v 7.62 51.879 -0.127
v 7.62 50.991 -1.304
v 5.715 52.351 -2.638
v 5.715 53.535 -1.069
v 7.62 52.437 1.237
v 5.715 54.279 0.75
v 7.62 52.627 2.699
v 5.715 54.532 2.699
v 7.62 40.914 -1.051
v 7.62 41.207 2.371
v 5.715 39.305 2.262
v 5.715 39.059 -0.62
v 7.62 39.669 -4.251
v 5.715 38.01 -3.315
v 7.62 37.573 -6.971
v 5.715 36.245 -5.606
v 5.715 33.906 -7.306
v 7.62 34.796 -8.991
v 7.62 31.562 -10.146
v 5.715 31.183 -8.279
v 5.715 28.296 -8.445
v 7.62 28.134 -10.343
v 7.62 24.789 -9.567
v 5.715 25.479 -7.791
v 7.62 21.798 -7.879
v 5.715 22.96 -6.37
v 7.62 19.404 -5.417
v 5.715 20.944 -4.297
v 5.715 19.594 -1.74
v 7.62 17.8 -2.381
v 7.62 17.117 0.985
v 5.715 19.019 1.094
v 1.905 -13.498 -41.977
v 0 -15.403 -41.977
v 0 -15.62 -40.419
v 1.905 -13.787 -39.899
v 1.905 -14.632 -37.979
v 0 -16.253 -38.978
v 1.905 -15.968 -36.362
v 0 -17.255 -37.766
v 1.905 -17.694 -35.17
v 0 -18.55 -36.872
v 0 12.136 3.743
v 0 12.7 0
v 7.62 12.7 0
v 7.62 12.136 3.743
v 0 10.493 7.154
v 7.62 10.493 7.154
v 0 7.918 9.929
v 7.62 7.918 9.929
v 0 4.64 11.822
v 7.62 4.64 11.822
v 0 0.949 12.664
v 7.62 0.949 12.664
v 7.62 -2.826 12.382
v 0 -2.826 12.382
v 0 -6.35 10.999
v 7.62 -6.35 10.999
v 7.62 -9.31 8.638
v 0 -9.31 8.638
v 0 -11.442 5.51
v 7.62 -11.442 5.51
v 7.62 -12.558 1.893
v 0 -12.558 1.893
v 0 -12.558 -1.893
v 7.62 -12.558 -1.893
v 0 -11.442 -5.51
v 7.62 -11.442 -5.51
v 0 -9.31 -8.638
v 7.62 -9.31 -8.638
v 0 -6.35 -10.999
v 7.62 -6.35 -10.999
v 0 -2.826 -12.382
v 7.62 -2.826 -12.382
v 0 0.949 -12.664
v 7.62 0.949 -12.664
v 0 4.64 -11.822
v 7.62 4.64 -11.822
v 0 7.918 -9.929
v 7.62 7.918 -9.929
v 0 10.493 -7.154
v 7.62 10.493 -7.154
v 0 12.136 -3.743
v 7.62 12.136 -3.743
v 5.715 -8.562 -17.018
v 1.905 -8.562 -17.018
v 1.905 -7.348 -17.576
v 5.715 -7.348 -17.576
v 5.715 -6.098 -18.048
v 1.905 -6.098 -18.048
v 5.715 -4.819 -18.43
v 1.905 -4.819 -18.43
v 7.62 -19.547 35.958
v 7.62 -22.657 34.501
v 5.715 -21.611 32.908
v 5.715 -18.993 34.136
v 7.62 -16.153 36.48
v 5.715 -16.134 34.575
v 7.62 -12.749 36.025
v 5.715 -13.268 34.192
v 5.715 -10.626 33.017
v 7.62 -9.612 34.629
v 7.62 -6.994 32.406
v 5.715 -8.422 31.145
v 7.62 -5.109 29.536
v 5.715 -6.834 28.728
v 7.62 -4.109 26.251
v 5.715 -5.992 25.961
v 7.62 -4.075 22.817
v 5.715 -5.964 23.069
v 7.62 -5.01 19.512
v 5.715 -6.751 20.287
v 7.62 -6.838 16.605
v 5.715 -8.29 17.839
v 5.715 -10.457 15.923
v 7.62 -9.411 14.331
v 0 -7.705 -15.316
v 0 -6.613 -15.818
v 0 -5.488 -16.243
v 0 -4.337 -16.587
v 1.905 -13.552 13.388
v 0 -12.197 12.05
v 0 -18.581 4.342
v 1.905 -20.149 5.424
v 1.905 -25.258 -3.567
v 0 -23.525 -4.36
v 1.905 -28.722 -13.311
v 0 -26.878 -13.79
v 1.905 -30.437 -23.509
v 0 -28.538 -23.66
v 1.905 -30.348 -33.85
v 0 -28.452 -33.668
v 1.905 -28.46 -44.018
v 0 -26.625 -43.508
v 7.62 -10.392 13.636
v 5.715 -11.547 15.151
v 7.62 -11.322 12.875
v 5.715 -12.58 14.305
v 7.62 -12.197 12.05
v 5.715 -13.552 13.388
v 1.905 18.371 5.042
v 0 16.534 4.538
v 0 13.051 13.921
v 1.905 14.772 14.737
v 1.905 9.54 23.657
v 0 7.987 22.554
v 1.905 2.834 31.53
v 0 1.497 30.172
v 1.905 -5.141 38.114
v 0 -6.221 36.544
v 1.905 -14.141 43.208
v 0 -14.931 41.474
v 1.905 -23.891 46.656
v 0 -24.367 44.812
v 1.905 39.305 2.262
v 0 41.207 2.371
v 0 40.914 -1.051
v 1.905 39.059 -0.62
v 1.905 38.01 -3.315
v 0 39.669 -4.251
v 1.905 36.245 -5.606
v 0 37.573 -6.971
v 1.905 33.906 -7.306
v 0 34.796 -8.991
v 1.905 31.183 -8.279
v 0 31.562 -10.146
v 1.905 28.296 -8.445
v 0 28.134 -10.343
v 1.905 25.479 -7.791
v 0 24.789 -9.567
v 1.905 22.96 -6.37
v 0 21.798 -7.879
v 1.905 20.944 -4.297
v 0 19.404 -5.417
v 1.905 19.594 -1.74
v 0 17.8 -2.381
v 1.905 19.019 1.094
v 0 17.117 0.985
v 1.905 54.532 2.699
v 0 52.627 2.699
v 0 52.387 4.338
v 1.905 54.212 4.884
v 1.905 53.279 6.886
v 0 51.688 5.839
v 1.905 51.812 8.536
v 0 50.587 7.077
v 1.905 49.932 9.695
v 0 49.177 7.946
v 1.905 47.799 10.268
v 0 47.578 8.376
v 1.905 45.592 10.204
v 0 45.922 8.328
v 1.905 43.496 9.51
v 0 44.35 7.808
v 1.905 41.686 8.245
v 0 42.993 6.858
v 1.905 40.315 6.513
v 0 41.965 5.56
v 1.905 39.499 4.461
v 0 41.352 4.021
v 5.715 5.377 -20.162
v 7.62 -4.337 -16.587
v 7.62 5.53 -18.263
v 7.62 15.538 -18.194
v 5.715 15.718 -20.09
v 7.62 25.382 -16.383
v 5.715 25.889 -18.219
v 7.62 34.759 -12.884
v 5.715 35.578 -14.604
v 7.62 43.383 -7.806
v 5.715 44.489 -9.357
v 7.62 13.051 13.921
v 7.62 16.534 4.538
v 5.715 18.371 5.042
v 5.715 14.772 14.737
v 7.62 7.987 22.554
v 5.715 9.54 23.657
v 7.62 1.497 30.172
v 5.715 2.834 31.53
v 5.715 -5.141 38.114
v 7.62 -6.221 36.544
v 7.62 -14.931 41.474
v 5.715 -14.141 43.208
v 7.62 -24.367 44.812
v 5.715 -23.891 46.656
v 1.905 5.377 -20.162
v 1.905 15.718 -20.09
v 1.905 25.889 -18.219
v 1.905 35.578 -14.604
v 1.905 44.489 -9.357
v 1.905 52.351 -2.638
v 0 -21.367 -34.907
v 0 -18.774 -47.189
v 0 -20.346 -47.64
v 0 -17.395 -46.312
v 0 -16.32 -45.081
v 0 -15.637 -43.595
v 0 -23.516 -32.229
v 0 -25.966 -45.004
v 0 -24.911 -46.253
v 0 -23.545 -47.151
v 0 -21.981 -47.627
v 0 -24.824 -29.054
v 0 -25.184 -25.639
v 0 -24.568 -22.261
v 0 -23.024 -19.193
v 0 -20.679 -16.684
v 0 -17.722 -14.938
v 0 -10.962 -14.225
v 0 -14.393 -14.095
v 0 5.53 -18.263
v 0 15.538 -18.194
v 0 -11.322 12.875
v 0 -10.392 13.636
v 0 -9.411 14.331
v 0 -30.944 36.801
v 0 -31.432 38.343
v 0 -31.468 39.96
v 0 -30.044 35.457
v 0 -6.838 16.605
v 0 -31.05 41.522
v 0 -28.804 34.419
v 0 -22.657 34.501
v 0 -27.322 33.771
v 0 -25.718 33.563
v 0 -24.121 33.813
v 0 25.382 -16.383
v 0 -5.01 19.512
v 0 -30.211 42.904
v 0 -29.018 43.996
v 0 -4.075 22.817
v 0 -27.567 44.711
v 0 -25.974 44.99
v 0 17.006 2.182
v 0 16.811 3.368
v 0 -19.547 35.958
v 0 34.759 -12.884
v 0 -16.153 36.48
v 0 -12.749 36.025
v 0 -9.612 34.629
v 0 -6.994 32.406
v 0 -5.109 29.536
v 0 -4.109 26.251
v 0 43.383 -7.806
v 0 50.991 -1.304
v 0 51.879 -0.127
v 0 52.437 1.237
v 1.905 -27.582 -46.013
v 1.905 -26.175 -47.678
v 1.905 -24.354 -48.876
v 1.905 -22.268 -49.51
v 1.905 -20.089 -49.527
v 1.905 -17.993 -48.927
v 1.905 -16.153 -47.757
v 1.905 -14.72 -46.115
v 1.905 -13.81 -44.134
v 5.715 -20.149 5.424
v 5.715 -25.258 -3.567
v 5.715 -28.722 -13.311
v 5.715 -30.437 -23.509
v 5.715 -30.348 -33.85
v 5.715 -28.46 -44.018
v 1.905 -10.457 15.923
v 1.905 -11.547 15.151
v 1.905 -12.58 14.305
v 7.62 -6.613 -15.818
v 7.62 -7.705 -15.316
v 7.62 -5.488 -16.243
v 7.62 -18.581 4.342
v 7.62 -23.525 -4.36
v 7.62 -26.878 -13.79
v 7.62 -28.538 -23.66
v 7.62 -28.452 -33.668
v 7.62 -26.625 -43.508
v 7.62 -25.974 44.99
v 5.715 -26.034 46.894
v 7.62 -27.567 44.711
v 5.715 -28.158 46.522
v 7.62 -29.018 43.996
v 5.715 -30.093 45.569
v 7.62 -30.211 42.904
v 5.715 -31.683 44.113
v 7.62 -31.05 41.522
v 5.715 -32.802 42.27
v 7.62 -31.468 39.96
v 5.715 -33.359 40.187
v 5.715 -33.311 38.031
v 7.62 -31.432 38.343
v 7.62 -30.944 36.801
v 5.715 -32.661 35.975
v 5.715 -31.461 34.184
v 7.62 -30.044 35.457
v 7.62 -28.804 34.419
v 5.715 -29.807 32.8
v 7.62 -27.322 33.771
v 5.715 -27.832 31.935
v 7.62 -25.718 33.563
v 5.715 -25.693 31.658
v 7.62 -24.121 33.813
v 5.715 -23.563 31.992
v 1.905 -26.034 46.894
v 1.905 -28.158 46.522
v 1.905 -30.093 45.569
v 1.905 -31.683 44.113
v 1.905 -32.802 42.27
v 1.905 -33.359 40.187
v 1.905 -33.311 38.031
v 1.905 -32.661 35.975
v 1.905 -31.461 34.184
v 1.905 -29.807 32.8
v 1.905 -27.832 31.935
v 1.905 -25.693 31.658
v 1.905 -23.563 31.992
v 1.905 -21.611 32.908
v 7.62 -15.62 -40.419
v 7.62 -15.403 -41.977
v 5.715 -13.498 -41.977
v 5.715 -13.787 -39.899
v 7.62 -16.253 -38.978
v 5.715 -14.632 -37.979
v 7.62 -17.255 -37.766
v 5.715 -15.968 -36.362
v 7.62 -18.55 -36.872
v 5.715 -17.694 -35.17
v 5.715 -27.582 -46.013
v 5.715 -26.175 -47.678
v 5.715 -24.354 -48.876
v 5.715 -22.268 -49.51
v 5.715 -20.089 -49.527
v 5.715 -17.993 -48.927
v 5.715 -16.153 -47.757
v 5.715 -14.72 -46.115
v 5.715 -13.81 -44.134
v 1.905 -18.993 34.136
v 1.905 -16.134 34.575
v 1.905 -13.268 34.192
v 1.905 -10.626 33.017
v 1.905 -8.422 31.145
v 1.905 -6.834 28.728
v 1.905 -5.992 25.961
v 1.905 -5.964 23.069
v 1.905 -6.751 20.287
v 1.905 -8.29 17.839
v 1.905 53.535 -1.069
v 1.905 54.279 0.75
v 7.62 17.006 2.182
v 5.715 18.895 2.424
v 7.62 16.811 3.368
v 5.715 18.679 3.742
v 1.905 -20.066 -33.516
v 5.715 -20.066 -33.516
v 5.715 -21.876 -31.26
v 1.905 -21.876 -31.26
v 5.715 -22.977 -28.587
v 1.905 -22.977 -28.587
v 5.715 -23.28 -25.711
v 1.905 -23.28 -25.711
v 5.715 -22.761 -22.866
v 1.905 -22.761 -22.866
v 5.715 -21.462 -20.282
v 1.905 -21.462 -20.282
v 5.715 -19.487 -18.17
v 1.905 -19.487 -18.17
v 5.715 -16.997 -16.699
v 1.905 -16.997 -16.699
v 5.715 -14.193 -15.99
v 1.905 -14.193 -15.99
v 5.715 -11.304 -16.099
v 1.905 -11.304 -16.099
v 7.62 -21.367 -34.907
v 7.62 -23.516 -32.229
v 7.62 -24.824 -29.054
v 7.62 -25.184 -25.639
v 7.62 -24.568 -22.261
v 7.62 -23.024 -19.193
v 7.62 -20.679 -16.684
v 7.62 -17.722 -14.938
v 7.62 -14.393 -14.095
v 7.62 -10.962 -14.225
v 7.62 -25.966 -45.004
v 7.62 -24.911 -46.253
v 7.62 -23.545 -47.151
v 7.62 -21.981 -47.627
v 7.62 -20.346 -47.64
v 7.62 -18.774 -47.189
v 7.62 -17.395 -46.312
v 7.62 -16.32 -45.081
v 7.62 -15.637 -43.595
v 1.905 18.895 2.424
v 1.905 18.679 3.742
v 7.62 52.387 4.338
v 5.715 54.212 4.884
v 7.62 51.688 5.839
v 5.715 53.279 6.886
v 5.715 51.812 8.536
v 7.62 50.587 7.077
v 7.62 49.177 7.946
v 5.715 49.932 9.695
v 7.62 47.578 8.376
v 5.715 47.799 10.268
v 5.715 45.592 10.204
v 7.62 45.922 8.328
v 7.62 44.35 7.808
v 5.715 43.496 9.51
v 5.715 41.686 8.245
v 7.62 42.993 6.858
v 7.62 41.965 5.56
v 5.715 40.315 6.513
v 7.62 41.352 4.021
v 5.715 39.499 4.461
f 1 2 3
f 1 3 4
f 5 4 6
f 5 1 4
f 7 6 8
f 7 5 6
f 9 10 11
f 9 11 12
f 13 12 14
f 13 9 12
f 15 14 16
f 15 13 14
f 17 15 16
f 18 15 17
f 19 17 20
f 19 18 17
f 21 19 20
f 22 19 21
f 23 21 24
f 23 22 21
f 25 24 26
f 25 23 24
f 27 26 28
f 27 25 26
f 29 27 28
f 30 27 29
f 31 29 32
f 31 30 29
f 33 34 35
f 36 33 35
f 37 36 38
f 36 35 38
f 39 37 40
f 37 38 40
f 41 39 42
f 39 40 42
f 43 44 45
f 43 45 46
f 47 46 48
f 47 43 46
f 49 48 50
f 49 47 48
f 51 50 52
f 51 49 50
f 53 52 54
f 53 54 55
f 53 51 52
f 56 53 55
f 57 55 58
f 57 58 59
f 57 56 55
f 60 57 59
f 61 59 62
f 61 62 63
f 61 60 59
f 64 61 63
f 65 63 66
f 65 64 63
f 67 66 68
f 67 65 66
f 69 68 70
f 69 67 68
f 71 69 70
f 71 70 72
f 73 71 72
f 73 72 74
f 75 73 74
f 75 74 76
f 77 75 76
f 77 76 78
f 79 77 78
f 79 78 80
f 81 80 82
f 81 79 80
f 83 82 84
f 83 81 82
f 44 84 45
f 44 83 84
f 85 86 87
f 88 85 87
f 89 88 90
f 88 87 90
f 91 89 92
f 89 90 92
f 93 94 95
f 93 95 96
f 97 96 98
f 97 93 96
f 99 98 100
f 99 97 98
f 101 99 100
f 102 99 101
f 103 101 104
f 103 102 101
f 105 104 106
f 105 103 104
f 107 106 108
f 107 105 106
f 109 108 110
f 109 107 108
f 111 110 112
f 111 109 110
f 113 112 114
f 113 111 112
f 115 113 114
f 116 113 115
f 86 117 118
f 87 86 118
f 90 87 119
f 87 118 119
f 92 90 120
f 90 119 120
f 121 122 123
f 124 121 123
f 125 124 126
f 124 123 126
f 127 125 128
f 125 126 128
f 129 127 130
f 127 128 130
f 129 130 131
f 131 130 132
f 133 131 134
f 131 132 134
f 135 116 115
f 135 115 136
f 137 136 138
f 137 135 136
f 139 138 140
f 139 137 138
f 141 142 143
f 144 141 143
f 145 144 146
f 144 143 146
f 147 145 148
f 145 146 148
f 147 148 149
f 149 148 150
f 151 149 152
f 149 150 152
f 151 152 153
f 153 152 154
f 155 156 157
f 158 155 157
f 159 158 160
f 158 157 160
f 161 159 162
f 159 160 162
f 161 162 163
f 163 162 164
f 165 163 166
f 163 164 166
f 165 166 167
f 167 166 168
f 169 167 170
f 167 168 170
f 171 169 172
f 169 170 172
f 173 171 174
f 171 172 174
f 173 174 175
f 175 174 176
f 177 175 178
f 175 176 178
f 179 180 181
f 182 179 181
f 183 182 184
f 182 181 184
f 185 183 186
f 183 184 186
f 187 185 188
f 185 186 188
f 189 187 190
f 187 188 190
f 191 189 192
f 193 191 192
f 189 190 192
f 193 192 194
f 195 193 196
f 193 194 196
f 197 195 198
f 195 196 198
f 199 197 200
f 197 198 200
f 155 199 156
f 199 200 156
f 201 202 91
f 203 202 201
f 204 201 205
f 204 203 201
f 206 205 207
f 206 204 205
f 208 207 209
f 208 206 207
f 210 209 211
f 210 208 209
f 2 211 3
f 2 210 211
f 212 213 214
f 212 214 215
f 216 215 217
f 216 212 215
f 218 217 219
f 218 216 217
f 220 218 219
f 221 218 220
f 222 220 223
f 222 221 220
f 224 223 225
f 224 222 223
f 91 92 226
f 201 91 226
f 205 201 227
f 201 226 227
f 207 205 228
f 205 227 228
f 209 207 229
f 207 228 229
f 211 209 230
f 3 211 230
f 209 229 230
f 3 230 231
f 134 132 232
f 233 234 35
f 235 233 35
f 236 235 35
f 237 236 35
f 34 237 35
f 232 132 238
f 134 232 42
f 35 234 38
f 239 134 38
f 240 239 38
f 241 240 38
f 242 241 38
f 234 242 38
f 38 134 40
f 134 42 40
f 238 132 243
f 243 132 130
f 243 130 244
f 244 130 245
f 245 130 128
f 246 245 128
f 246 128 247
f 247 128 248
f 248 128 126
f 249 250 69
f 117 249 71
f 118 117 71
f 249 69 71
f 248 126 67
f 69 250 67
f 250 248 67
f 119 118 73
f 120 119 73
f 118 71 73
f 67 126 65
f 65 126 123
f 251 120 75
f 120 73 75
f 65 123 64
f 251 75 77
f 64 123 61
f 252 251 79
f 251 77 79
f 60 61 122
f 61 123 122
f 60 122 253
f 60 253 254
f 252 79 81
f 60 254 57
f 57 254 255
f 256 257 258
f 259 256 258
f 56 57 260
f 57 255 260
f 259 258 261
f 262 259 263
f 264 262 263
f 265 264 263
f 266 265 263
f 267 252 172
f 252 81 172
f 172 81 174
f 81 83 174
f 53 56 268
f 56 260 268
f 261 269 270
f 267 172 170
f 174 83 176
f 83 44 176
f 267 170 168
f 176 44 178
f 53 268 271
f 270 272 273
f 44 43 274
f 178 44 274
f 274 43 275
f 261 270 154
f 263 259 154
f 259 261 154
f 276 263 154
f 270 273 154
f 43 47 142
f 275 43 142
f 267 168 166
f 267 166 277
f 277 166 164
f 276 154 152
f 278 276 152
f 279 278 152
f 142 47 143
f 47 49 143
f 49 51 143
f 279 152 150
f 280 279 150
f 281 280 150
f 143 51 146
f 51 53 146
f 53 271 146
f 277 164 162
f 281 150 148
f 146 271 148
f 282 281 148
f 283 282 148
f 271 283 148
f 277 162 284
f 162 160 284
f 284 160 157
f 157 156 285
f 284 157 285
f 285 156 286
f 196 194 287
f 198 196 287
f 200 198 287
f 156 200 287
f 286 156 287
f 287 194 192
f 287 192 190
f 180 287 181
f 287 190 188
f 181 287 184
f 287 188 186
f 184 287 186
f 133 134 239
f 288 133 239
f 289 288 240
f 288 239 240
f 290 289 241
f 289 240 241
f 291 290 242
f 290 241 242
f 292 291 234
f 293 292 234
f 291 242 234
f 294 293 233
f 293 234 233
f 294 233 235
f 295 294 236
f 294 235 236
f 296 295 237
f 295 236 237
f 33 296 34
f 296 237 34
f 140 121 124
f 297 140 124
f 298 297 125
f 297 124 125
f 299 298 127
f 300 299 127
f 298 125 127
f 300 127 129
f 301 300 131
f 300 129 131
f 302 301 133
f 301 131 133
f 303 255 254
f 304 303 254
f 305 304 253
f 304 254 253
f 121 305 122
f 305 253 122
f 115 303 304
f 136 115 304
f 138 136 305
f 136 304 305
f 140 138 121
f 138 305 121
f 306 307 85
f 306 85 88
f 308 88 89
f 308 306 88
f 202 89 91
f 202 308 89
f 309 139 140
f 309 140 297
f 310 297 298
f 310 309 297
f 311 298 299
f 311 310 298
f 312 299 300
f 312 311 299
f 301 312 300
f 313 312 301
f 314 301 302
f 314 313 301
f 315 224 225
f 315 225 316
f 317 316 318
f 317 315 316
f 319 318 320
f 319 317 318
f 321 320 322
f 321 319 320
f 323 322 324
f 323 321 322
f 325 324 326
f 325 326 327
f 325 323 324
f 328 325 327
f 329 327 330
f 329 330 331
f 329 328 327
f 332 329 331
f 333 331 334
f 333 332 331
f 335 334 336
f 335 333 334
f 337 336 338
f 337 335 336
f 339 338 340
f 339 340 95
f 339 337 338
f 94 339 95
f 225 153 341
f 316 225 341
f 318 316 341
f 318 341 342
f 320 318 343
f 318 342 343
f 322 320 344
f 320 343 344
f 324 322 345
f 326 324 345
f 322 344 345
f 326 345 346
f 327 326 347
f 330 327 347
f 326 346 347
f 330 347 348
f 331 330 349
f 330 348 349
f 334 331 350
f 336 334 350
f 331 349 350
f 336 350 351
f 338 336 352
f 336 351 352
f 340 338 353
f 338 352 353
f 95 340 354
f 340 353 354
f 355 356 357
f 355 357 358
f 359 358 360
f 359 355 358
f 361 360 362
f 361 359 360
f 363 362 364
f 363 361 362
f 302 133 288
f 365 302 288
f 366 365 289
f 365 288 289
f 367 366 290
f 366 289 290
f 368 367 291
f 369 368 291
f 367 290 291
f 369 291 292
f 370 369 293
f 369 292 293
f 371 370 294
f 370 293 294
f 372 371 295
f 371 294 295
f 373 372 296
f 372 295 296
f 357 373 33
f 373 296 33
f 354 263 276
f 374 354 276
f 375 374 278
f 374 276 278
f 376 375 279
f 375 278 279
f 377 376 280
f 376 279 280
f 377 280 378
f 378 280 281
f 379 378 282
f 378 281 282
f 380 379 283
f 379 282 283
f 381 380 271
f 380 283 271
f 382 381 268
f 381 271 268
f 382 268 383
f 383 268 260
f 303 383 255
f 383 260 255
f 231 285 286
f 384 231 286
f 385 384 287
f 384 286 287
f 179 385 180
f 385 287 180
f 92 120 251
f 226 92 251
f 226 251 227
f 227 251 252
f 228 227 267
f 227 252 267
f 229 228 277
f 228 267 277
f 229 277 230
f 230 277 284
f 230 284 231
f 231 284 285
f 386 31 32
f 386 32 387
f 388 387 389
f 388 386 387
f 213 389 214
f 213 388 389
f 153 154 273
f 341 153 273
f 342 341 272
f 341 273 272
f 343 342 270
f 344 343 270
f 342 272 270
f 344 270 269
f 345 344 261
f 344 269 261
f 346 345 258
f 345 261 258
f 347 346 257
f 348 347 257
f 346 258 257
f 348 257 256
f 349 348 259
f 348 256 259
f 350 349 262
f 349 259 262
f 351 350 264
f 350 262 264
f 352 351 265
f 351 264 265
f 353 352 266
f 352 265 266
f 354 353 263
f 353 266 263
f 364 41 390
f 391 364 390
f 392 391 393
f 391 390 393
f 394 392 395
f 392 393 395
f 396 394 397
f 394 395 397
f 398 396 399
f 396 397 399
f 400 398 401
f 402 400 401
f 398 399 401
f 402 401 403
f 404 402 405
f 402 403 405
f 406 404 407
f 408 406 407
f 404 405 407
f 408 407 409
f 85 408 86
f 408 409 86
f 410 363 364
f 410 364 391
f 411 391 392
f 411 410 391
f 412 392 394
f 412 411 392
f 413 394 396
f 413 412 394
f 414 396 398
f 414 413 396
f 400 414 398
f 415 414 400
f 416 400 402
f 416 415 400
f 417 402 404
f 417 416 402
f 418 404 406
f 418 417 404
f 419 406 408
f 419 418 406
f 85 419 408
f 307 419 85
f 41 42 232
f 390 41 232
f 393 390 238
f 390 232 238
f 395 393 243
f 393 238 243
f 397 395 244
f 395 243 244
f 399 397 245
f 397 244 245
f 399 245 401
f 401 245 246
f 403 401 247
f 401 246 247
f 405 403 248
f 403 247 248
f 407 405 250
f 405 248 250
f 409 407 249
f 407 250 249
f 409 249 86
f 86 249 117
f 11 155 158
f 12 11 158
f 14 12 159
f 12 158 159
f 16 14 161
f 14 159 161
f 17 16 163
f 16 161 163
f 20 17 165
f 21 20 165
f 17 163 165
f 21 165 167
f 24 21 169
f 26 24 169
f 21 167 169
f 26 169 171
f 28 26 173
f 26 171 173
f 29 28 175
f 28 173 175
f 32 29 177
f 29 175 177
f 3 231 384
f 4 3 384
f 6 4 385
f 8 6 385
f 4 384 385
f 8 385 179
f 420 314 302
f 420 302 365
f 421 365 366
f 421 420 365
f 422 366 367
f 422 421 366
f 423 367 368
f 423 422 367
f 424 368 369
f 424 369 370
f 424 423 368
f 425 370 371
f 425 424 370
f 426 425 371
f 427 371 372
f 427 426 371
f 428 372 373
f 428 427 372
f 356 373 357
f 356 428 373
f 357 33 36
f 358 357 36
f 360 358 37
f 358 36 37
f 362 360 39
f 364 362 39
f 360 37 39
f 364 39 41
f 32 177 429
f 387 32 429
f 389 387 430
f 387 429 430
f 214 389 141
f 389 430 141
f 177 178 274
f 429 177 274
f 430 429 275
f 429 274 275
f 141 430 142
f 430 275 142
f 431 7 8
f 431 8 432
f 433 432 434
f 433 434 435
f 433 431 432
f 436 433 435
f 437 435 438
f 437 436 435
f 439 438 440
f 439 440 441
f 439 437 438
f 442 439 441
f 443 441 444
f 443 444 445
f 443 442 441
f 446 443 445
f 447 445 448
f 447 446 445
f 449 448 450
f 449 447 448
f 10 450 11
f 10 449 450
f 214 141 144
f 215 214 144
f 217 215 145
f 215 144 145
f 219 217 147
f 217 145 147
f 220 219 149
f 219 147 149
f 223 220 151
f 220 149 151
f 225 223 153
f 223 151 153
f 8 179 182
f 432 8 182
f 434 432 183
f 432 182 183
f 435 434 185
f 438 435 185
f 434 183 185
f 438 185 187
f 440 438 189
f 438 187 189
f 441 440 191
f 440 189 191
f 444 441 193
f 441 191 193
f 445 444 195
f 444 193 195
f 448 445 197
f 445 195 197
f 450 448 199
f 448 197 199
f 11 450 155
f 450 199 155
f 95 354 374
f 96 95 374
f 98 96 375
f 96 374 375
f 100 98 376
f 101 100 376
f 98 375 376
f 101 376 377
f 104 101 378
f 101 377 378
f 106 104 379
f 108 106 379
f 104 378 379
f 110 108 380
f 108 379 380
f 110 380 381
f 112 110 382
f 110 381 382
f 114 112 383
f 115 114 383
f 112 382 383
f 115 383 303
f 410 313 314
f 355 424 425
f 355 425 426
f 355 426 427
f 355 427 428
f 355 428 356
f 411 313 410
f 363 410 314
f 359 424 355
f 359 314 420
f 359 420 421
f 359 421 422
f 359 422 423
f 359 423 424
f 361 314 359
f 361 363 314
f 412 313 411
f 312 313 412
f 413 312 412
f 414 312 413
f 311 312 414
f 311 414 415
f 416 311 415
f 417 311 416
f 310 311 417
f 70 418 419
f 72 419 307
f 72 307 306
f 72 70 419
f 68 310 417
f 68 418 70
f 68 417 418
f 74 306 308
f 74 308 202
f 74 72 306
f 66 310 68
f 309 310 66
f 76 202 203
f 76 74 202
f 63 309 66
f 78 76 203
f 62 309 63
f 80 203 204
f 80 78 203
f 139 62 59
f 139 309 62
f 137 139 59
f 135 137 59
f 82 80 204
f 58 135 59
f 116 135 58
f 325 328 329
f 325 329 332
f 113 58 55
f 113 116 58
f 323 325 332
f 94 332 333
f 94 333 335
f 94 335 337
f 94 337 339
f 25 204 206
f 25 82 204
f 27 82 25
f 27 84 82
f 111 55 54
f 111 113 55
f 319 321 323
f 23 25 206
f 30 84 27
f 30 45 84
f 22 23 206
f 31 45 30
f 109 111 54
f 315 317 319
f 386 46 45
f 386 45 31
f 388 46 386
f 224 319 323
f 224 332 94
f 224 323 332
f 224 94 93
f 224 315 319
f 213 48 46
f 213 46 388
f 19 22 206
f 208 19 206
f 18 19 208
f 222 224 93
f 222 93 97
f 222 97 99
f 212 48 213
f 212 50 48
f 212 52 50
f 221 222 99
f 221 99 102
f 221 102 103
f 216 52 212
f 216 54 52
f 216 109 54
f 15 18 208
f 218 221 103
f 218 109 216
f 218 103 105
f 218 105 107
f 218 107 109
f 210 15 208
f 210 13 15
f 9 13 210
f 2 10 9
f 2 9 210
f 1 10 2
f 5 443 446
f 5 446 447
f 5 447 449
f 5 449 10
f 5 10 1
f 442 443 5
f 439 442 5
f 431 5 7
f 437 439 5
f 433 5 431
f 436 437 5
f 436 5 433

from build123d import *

# Parameters (mm, degrees)
F0_R     = 12.7
F1_DEPTH = 7.62
F2_SIZE  = 1.905


with BuildPart() as f1:
    # F0 (on Right) → F1 (new body)
    with BuildSketch(Plane.YZ):
        with BuildLine():
            ThreePointArc((-4.818668, -18.430489), (11.642742, -15.078099), (19.05, 0))
            ThreePointArc((19.05, 0), (19.042134, 0.547394), (19.018542, 1.094337))
            ThreePointArc((19.018542, 1.094337), (18.798495, 3.085302), (18.370606, 5.042156))
            ThreePointArc((18.370606, 5.042156), (6.727297, 17.822625), (-10.456994, 15.923372))
            ThreePointArc((-10.456994, 15.923372), (-12.071198, 14.737323), (-13.551938, 13.388334))
            ThreePointArc((-13.551938, 13.388334), (-18.798495, -3.085302), (-8.561547, -17.017709))
            ThreePointArc((-8.561547, -17.017709), (-6.727297, -17.822625), (-4.818668, -18.430489))
        make_face()
        Circle(F0_R, mode=Mode.SUBTRACT)
        with BuildLine():
            ThreePointArc((19.018542, 1.094337), (19.042134, 0.547394), (19.05, 0))
            ThreePointArc((19.05, 0), (11.642742, -15.078099), (-4.818668, -18.430489))
            ThreePointArc((-4.818668, -18.430489), (25.888789, -18.218752), (52.350766, -2.638108))
            ThreePointArc((52.350766, -2.638108), (44.233214, -4.434102), (39.304986, 2.26163))
            ThreePointArc((39.304986, 2.26163), (29.74541, -8.465239), (19.018542, 1.094337))
        make_face()
        with BuildLine():
            ThreePointArc((-10.456994, 15.923372), (6.727297, 17.822625), (18.370606, 5.042156))
            ThreePointArc((18.370606, 5.042156), (2.833508, 31.529725), (-23.890715, 46.656147))
            ThreePointArc((-23.890715, 46.656147), (-19.770348, 43.944661), (-18.173919, 39.27765))
            ThreePointArc((-18.173919, 39.27765), (-19.088052, 35.658847), (-21.611122, 32.908302))
            ThreePointArc((-21.611122, 32.908302), (-7.541593, 29.9929), (-10.456994, 15.923372))
        make_face()
        with BuildLine():
            ThreePointArc((54.532403, 2.699364), (46.693445, 10.316218), (39.304986, 2.26163))
            ThreePointArc((39.304986, 2.26163), (44.233214, -4.434102), (52.350766, -2.638108))
            ThreePointArc((52.350766, -2.638108), (53.965938, -0.183696), (54.532403, 2.699364))
        make_face()
        with BuildLine():
            ThreePointArc((-17.693864, -35.169931), (-22.203817, -21.527661), (-8.561547, -17.017709))
            ThreePointArc((-8.561547, -17.017709), (-18.798495, -3.085302), (-13.551938, 13.388334))
            ThreePointArc((-13.551938, 13.388334), (-28.722296, -13.310972), (-28.460051, -44.018039))
            ThreePointArc((-28.460051, -44.018039), (-25.956652, -36.090035), (-17.693864, -35.169931))
        make_face()
        with BuildLine():
            ThreePointArc((-18.173919, 39.27765), (-19.770348, 43.944661), (-23.890715, 46.656147))
            ThreePointArc((-23.890715, 46.656147), (-33.311277, 38.031163), (-21.611122, 32.908302))
            ThreePointArc((-21.611122, 32.908302), (-19.088052, 35.658847), (-18.173919, 39.27765))
        make_face()
        with BuildLine():
            ThreePointArc((-13.498483, -41.977015), (-14.631574, -37.978965), (-17.693864, -35.169931))
            ThreePointArc((-17.693864, -35.169931), (-25.956652, -36.090035), (-28.460051, -44.018039))
            ThreePointArc((-28.460051, -44.018039), (-20.088519, -49.527086), (-13.498483, -41.977015))
        make_face()
    extrude(amount=F1_DEPTH)

    # F2
    f2_edges = [f1.edges().sort_by_distance(p)[0] for p in [
        (0, 25.888789, -18.218752),
        (0, 29.74541, -8.465239),
        (7.62, 25.888789, -18.218752),
    ]]
    chamfer(f2_edges, length=F2_SIZE)


solid = f1.part
